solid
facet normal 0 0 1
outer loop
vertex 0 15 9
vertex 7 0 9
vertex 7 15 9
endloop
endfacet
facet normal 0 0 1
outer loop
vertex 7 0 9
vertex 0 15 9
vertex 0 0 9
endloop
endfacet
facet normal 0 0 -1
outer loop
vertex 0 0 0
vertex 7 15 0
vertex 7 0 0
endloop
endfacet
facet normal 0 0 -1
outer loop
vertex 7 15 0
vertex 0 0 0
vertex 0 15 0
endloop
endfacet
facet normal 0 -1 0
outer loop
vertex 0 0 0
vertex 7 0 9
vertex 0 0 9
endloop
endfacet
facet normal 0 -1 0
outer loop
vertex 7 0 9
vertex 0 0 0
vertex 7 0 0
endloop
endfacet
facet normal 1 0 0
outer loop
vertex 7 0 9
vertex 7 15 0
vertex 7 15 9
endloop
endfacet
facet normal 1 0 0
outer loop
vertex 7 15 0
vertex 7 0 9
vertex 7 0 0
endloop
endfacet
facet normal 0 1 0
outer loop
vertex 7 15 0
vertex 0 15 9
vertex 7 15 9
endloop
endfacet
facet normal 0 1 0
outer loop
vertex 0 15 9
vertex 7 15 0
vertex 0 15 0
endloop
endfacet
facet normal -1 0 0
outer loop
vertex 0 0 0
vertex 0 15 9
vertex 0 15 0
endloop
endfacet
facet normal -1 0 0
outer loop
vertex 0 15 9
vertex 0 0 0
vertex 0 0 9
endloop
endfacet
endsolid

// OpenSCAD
// Generated by SolidPython 1.0.1 on 2020-07-29 00:46:55


cube(size = [7, 15, 9]);
/***********************************************
*********      SolidPython code:      **********
************************************************
 
# import packages: SolidPython
from solid import *
from solid.utils import *
from itertools import chain, combinations, permutations


class Resize:

    def __init__(self, scad_file):
        self.scad_file = scad_file
        #self.scad_file = import_scad(scad_file)
        # cone/cylinder param:
        self.r1 = 0
        self.r2 = 0
        self.h = 0
        # rectangular prism param:
        self.w = 0
        self.l = 0
        # ellipse param:
        self.r = 0

    # import OpenScad code (file name corresponds to shape)


    # classify shape + parameters
    def assign(self, param1, param2, param3):
        if self.scad_file == 'cone.scad':
            self.r1 = param1
            self.r2 = param2
            self.h = param3
        elif self.scad_file == 'cylinder.scad':
            self.r1 = param1
            self.r2 = param2
            self.h = param3
        elif self.scad_file == 'rectangularPrism.scad':
            self.h = param1
            self.l = param2
            self.w = param3
        else:
            self.r = param1
            self.h = param2

    # resize parameters
    def iterate(self):
        x = range(3, 20, 2)
        i = 1
        if self.scad_file == 'cone.scad':
            tempList = list(permutations(x, 2))
            for temp in tempList:
                param1 = temp[0]
                param2 = temp[1]
                filepath = 'produced_scad_files/' + 'cone' + str(param1) + '_' + str(param2) + '_' + '.scad'
                scad_render_to_file(cylinder(h=param1, r1=param2, r2=0), filepath)

        elif self.scad_file == 'cylinder.scad':
            tempList = list(permutations(x, 3))
            for temp in tempList:
                param1 = temp[0]
                param2 = temp[1]
                filepath = 'produced_scad_files/' + 'cylinder' + str(param1) + '_' + str(param2) + '_' + '.scad'
                scad_render_to_file(cylinder(h=param1, r1=param2, r2=param2), filepath)

        elif self.scad_file == 'rectangularPrism.scad':
            tempList = list(permutations(x, 3))
            for temp in tempList:
                param1 = temp[0]
                param2 = temp[1]
                param3 = temp[2]
                filepath = 'produced_scad_files/' + 'rectangularPrism' + str(param1) + '_' + str(param2) + '_' + str(
                    param3) + '.scad'
                scad_render_to_file(cube(size=(param1, param2, param3)), filepath)

        elif self.scad_file == 'ellipse.scad':
            tempList = list(permutations(x, 4))
            for temp in tempList:
                param1 = temp[0]
                param2 = temp[1]
                param3 = temp[2]
                param4 = temp[3]
                filepath = 'produced_scad_files/' + 'ellipse' + str(param1) + '_' + str(param2) + '_' + str(param3) + '_' + str(param4) + '.scad'
                scad_render_to_file(scale([param1, param2, param3])(sphere(r=param4)), filepath)

    def render_to_scadfile(self):
        scad_render_to_file(scad, 'example.scad') 
 
************************************************/
